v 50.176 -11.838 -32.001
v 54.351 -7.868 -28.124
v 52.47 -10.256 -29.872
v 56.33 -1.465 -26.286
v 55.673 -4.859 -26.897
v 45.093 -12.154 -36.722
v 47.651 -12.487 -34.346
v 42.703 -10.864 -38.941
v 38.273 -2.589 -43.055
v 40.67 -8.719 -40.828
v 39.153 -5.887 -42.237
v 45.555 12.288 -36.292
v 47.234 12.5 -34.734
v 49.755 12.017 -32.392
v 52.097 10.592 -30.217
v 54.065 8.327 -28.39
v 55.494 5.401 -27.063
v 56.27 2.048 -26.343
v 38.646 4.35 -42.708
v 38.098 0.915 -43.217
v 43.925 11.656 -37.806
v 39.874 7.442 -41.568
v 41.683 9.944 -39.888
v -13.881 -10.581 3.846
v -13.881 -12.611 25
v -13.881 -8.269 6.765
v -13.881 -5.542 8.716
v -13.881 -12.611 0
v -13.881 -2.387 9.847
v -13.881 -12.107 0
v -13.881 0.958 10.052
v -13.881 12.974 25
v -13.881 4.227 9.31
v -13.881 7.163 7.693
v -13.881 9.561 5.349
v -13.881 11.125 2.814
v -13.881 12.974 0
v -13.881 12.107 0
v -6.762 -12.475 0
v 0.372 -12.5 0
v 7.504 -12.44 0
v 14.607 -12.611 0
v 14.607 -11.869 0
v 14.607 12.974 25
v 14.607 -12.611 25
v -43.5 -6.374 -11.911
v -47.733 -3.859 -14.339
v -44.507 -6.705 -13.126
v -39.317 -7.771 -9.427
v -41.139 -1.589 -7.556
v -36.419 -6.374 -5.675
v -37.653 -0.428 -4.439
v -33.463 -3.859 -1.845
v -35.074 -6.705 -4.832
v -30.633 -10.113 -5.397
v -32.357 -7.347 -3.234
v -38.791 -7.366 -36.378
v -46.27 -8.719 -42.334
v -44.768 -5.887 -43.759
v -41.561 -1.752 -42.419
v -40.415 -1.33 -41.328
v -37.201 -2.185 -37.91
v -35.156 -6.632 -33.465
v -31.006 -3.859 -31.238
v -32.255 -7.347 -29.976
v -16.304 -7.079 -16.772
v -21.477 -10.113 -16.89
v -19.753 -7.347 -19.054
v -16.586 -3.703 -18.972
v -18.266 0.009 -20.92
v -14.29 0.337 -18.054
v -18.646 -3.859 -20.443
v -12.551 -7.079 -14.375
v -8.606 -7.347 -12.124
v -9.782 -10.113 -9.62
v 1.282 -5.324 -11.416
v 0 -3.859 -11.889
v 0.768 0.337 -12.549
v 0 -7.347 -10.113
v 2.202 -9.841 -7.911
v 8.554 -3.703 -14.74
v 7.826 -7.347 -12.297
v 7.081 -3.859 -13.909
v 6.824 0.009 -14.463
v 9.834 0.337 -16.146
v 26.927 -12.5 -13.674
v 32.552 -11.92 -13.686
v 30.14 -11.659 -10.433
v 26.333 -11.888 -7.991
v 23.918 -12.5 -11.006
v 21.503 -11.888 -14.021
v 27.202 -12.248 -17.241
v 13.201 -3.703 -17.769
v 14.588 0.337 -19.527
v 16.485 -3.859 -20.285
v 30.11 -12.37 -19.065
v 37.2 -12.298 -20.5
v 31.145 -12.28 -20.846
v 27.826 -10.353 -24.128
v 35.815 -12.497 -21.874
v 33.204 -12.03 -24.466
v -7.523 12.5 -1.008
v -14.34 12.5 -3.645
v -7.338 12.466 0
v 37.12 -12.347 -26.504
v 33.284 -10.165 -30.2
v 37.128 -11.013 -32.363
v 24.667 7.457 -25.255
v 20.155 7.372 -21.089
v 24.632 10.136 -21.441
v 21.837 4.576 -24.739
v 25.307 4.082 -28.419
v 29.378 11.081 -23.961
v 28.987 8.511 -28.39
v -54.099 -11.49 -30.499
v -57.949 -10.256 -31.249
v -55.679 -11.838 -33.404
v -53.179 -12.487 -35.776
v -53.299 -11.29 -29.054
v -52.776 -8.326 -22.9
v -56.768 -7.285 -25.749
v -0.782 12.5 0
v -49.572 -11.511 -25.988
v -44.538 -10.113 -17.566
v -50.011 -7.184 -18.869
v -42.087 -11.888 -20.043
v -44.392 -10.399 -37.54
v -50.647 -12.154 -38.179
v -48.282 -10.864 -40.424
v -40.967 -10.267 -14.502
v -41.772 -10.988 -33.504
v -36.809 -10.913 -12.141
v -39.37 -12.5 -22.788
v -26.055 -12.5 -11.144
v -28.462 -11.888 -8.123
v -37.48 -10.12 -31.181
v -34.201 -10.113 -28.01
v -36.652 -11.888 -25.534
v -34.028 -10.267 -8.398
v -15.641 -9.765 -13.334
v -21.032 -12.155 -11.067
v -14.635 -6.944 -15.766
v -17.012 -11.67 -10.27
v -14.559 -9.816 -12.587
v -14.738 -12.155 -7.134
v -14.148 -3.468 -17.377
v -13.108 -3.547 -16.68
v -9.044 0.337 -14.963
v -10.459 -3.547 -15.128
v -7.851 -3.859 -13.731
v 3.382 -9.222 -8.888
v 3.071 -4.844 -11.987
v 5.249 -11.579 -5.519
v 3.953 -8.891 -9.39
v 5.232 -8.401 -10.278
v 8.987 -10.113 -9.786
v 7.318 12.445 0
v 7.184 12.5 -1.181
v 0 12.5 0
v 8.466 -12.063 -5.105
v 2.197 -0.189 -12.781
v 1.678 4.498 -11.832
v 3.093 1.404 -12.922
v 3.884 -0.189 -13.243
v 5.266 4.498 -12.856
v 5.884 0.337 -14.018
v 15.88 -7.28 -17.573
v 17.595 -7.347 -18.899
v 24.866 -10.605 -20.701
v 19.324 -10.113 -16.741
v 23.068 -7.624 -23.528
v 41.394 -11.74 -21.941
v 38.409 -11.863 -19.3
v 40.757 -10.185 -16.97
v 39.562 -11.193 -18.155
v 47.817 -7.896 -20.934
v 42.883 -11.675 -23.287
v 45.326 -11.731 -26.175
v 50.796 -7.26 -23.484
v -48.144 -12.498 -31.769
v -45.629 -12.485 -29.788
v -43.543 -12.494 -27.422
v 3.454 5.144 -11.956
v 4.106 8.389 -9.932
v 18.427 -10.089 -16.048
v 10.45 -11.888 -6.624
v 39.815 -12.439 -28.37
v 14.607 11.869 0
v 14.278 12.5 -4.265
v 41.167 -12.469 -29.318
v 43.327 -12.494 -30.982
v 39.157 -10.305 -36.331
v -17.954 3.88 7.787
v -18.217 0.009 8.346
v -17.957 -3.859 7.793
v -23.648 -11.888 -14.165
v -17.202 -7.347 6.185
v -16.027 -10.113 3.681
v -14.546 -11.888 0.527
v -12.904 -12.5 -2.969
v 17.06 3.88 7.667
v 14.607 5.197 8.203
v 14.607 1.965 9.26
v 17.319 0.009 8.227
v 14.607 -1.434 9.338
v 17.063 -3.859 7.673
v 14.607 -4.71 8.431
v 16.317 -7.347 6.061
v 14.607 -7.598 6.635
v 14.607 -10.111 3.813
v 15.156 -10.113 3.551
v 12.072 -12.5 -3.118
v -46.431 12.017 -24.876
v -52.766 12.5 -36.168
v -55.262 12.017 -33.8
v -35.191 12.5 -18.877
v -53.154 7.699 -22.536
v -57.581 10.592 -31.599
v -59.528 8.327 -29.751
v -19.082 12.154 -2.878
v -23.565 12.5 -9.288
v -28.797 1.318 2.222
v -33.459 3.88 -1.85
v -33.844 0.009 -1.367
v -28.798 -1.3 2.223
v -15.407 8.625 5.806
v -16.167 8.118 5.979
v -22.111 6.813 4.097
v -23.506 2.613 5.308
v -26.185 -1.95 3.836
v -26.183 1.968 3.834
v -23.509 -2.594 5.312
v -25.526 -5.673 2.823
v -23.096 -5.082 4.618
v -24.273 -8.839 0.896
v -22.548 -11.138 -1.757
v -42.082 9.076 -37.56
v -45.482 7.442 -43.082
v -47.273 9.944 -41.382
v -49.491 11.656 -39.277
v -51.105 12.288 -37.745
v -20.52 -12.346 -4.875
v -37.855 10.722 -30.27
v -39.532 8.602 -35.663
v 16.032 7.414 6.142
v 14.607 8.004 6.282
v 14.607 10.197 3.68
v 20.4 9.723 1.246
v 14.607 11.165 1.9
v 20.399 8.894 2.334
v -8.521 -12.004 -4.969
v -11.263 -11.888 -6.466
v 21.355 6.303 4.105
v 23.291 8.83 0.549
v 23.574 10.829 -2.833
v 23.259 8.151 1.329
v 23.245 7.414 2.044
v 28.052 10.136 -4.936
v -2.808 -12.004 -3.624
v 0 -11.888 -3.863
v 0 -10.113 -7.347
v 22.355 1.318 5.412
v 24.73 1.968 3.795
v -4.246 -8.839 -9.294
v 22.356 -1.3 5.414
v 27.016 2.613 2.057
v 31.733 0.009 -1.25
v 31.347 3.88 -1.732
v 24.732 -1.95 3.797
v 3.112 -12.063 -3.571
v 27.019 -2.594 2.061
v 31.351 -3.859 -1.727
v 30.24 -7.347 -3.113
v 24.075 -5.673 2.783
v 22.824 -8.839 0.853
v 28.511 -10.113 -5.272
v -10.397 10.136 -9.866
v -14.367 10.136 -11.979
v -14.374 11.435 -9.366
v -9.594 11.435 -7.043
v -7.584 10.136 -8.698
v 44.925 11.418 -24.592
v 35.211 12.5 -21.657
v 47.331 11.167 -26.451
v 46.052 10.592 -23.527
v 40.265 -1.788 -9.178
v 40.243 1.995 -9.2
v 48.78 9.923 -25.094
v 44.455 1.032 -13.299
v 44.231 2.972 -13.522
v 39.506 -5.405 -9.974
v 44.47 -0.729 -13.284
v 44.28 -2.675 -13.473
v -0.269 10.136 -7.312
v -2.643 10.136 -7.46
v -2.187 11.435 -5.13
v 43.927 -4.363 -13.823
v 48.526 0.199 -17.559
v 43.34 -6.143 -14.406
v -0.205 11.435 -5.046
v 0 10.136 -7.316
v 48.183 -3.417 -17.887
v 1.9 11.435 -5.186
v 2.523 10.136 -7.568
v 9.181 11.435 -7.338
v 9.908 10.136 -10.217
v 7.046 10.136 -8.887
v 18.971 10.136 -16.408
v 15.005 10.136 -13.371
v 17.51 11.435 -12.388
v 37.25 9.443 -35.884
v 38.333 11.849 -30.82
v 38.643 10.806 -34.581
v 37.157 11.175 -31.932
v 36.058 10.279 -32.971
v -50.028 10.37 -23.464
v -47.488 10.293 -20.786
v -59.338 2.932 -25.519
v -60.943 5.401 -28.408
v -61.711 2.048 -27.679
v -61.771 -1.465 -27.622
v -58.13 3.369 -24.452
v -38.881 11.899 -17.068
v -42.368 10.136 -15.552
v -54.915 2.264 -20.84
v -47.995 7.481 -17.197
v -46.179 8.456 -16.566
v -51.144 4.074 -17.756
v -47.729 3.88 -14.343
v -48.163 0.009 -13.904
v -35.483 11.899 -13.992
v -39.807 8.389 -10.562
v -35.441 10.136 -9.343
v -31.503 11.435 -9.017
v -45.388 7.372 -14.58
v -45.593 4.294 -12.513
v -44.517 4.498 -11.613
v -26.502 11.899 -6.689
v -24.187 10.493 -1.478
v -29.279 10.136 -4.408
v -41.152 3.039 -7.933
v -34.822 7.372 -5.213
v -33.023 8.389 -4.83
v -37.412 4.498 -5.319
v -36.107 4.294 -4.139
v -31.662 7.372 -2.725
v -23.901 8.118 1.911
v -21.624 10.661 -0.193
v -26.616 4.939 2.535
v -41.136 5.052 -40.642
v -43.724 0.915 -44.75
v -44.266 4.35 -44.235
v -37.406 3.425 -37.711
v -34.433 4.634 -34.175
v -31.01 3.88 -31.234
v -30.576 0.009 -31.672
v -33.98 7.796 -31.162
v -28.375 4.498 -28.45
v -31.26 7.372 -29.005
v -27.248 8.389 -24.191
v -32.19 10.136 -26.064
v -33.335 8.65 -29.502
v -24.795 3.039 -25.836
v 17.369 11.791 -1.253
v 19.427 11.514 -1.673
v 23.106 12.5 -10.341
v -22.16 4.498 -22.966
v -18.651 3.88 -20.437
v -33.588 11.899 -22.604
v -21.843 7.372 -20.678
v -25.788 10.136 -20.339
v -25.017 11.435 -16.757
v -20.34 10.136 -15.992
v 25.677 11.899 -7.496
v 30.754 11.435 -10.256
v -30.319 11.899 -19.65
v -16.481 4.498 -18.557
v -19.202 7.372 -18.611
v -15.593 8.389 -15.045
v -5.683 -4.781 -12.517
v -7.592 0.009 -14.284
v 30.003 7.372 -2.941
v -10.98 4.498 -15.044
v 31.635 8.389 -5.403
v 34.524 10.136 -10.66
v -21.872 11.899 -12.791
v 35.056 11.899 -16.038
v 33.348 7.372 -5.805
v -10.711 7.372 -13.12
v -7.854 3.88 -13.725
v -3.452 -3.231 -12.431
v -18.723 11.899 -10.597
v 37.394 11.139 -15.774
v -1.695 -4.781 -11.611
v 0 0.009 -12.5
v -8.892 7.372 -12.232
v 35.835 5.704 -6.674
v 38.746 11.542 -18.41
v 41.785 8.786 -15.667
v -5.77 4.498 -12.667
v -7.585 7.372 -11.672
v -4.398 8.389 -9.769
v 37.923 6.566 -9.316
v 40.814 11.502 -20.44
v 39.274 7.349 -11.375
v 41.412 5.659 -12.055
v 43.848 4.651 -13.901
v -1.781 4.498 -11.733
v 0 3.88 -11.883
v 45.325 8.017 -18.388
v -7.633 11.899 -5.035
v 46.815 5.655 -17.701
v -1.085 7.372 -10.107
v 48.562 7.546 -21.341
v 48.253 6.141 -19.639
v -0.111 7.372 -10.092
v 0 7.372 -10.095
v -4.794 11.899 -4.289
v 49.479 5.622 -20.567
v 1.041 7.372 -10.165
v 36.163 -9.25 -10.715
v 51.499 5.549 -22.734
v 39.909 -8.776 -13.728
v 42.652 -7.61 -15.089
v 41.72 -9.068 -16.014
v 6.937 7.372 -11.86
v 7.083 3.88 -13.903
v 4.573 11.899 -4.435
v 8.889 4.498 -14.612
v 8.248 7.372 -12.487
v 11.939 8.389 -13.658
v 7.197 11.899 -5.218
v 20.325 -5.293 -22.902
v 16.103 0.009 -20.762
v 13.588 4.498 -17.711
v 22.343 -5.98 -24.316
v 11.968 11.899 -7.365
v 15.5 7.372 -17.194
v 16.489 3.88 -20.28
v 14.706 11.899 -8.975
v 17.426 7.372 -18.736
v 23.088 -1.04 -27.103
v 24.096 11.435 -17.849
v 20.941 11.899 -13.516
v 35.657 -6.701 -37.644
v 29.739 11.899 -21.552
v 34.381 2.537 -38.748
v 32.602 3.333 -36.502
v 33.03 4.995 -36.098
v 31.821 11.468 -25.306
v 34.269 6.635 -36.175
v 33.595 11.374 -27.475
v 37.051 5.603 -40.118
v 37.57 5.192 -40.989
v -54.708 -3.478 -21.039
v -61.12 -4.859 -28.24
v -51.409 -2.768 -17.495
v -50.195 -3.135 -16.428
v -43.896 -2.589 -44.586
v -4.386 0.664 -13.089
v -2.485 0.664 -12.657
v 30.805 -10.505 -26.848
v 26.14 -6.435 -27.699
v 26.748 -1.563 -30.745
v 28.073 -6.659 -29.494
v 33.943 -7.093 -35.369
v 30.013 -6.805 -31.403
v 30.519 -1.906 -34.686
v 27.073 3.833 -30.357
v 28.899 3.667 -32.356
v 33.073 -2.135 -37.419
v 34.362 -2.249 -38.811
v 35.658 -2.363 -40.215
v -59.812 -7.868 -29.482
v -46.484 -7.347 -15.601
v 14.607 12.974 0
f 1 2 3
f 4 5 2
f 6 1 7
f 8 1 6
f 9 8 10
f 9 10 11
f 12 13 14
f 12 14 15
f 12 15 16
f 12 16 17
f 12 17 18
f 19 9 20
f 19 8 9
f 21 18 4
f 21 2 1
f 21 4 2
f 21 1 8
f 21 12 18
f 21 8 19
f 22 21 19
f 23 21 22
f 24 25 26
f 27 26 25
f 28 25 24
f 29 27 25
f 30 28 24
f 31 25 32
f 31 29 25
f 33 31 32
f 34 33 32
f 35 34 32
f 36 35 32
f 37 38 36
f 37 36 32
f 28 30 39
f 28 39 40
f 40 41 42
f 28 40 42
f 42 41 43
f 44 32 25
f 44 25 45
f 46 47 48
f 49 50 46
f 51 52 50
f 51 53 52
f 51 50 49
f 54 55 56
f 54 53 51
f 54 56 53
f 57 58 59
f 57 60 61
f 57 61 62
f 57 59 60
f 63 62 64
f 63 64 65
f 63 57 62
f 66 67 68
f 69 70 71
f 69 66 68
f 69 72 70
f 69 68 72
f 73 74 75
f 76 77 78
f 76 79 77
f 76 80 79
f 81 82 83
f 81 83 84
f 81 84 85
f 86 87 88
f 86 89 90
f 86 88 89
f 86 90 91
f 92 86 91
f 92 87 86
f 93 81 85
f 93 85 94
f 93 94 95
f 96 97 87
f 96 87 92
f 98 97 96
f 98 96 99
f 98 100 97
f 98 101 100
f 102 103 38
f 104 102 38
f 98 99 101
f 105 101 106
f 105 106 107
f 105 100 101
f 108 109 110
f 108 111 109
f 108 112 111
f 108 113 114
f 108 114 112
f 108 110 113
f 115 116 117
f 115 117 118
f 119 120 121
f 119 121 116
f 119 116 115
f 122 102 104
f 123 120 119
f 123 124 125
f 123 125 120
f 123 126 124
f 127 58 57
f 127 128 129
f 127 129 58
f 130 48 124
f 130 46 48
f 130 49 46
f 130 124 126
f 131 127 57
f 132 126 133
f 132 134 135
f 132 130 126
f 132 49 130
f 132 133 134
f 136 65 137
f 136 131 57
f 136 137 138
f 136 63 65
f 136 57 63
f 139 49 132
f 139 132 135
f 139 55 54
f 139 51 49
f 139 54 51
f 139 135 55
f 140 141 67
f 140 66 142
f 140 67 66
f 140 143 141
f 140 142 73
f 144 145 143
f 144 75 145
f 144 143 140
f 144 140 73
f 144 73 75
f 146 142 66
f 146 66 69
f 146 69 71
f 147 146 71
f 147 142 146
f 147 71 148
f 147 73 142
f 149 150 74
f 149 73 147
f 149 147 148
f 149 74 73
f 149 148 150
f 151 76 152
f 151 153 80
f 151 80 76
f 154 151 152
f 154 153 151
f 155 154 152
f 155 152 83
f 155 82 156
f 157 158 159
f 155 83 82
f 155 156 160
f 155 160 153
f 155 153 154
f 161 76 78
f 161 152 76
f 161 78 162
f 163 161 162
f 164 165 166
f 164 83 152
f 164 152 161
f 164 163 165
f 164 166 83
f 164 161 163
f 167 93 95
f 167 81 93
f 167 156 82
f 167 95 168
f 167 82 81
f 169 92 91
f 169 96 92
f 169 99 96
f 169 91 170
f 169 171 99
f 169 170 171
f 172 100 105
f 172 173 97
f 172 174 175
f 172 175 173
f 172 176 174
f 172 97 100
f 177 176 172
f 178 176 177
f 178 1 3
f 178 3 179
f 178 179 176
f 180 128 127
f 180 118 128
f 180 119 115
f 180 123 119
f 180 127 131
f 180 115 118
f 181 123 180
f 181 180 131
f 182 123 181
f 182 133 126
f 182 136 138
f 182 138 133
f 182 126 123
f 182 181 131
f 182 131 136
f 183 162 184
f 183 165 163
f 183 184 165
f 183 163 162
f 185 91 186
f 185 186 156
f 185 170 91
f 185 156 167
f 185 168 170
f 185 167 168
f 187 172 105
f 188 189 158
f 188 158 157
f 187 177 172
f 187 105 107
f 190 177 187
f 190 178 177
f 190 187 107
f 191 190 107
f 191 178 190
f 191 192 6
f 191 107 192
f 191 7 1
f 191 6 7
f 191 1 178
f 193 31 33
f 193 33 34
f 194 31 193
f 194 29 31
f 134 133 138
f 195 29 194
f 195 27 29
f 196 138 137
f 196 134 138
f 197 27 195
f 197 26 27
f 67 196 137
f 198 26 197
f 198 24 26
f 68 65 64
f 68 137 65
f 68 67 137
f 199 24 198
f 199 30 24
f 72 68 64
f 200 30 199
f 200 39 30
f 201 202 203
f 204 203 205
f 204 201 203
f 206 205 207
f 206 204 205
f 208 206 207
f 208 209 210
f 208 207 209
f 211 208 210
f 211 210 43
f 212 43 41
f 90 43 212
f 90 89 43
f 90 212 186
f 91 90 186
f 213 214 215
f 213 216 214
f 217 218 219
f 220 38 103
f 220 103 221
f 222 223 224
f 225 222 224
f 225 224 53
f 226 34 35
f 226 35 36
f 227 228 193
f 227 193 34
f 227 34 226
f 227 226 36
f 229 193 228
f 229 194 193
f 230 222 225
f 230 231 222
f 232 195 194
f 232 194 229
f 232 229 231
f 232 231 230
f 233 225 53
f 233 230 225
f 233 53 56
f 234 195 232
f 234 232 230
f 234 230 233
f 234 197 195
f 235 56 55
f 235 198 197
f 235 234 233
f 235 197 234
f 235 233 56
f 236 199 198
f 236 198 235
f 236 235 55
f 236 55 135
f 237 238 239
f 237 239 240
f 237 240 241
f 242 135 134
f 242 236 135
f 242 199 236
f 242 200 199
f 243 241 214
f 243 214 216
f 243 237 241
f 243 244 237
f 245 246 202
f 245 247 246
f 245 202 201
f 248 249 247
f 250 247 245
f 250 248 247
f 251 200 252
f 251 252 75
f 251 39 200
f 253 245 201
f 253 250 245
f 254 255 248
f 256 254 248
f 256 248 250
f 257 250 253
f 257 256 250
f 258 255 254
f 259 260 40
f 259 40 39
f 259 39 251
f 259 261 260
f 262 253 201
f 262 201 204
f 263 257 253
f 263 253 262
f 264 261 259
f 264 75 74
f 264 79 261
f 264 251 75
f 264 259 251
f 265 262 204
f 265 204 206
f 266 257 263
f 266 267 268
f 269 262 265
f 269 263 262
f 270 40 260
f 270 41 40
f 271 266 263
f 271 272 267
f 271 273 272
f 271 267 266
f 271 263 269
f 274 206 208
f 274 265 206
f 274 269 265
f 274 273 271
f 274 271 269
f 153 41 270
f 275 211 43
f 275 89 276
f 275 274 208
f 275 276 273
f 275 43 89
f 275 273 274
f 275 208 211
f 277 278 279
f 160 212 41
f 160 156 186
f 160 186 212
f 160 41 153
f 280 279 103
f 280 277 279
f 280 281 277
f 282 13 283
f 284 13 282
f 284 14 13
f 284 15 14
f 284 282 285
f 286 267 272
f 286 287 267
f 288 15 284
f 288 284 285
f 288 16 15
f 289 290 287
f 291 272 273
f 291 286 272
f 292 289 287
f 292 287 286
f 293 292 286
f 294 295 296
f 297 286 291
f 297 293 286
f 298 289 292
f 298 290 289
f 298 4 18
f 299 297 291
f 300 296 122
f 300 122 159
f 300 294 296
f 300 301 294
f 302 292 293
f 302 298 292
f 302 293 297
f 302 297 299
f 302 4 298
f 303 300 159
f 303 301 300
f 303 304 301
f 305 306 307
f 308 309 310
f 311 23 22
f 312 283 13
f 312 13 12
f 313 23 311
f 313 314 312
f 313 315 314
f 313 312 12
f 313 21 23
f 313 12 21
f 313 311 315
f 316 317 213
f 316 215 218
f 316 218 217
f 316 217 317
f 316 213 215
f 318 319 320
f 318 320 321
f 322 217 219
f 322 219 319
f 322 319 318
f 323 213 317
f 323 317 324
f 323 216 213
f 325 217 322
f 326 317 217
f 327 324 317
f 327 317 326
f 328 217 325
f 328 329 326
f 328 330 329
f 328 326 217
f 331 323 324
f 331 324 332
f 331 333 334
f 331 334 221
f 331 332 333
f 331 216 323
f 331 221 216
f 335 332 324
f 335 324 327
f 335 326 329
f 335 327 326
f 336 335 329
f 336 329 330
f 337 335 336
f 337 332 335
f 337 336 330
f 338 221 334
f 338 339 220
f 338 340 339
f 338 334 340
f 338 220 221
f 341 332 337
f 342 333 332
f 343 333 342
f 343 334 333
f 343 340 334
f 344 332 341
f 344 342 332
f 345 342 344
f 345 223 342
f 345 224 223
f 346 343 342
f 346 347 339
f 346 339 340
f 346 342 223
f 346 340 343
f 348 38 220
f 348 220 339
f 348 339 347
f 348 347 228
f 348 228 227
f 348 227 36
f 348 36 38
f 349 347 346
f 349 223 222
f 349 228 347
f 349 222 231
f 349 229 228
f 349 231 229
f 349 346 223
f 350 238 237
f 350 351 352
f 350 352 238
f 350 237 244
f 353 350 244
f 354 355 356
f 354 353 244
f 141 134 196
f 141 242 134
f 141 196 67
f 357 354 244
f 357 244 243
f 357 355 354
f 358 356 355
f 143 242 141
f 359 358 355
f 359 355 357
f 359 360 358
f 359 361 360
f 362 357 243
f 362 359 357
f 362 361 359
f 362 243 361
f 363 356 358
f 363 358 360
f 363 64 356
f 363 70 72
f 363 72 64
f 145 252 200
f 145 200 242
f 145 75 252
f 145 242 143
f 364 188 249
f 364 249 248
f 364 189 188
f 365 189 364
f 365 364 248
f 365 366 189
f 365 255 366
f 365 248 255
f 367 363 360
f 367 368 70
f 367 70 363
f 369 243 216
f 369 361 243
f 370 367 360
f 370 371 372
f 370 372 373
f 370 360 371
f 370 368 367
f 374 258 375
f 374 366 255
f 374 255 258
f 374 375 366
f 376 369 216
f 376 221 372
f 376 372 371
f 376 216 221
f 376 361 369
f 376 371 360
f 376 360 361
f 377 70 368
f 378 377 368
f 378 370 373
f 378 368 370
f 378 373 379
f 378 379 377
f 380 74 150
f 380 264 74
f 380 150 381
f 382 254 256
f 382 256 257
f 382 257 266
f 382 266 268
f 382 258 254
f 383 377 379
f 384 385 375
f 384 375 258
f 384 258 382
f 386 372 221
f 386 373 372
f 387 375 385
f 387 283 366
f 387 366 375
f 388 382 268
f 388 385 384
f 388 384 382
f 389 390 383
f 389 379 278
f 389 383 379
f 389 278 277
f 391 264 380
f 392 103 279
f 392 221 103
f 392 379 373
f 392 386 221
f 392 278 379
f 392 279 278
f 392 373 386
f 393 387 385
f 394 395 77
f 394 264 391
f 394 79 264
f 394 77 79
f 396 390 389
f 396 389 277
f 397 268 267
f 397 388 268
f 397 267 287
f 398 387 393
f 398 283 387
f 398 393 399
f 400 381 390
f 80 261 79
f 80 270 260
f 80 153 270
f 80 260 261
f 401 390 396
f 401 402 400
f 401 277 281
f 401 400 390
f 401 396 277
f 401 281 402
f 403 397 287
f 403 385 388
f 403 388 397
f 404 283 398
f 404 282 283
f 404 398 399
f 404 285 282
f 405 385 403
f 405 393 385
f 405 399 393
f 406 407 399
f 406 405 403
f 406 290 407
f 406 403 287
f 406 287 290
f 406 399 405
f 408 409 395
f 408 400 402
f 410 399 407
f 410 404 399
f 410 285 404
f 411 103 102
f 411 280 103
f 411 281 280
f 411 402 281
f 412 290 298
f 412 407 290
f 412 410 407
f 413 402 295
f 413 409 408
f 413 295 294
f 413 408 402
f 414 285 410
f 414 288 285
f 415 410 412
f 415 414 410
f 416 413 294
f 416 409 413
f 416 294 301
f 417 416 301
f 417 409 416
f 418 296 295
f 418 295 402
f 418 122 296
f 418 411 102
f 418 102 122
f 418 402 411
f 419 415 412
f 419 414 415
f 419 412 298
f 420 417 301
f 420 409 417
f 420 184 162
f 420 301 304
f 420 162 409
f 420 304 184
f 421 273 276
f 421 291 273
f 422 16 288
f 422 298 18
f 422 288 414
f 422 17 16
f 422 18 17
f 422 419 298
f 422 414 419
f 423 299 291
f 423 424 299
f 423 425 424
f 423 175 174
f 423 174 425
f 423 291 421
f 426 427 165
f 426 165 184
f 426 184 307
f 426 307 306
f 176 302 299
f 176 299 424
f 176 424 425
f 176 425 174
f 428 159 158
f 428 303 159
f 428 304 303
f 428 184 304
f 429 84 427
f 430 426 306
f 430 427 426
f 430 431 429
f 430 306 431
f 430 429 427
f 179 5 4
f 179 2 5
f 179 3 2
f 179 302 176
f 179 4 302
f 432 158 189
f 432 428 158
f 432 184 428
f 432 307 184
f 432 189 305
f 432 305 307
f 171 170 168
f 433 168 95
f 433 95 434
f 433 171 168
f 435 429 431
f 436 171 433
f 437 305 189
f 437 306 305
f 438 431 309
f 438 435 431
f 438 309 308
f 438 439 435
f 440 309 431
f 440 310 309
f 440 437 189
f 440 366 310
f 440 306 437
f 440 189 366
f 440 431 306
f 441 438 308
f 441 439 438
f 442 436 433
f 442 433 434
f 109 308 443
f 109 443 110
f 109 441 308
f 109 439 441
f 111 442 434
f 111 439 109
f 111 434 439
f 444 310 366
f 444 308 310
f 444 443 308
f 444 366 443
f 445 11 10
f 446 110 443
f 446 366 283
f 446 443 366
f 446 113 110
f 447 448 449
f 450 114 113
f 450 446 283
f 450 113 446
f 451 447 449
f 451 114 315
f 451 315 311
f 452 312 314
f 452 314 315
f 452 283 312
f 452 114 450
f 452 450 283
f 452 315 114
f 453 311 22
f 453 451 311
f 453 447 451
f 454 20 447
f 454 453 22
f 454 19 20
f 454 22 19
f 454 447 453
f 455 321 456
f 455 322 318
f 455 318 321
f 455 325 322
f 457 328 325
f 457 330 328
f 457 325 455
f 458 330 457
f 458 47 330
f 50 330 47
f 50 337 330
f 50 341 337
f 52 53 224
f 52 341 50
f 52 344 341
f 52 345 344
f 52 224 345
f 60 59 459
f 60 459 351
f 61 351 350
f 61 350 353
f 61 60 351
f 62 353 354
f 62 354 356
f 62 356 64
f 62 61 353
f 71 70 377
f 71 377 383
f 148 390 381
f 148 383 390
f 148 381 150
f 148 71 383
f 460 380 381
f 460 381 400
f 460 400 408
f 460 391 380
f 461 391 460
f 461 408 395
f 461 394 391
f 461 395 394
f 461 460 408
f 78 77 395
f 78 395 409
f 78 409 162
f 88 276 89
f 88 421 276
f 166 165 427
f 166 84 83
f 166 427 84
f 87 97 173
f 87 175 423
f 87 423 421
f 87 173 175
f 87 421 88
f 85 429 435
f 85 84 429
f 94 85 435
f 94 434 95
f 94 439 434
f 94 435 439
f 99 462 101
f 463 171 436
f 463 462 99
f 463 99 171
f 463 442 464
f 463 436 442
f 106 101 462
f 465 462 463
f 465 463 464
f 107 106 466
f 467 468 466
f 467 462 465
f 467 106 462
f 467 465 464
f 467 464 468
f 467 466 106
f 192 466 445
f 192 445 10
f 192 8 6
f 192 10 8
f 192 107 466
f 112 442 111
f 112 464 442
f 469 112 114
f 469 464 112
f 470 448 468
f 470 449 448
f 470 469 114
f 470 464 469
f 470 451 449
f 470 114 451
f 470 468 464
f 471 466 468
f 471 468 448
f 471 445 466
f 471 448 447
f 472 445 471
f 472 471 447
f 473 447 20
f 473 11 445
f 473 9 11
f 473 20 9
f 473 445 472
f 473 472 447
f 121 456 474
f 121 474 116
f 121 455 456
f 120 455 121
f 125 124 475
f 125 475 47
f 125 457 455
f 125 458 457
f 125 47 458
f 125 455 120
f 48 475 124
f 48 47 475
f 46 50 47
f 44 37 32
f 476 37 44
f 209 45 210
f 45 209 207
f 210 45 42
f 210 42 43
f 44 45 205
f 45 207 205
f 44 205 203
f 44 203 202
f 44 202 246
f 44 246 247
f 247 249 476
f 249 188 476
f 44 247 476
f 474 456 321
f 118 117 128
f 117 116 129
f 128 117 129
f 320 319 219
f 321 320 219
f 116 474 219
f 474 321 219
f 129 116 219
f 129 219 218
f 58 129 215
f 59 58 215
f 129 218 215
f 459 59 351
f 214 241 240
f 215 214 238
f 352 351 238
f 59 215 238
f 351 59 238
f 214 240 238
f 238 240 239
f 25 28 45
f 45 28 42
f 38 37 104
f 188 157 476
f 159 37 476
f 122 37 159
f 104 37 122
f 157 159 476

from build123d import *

# Parameters (mm, degrees)
F0_R     = 12.5
F3_W     = 28.4879058599
F3_H     = 25.5846790969
F4_DEPTH = 25


with BuildPart() as f2:
    # F2: sweep along a path in F1
    with BuildLine(Plane.XZ) as f2_path:
        add(Plane.XZ * Edge.make_bspline(
            [(-52.7663948565, -36.1680299247), (-34.8857263736, -17.9429488086), (0.1127210252, 17.7296292828), (31.7565659621, -17.5018500525), (47.2336051435, -34.7336051435)],
            knots=[0, 0, 0, 0, 0.5108989059, 1, 1, 1, 1], degree=3))
    # F0 (on Right) → F2 (sweep)
    with BuildSketch(Plane.YZ):
        Circle(F0_R)
    sweep(path=f2_path.line)

    # F3 (on Top) → F4 (join)
    with BuildSketch(Plane.XY):
        with Locations((0.3629028797, 0.1814505085)):
            Rectangle(F3_W, F3_H)
    extrude(amount=F4_DEPTH)


solid = f2.part
